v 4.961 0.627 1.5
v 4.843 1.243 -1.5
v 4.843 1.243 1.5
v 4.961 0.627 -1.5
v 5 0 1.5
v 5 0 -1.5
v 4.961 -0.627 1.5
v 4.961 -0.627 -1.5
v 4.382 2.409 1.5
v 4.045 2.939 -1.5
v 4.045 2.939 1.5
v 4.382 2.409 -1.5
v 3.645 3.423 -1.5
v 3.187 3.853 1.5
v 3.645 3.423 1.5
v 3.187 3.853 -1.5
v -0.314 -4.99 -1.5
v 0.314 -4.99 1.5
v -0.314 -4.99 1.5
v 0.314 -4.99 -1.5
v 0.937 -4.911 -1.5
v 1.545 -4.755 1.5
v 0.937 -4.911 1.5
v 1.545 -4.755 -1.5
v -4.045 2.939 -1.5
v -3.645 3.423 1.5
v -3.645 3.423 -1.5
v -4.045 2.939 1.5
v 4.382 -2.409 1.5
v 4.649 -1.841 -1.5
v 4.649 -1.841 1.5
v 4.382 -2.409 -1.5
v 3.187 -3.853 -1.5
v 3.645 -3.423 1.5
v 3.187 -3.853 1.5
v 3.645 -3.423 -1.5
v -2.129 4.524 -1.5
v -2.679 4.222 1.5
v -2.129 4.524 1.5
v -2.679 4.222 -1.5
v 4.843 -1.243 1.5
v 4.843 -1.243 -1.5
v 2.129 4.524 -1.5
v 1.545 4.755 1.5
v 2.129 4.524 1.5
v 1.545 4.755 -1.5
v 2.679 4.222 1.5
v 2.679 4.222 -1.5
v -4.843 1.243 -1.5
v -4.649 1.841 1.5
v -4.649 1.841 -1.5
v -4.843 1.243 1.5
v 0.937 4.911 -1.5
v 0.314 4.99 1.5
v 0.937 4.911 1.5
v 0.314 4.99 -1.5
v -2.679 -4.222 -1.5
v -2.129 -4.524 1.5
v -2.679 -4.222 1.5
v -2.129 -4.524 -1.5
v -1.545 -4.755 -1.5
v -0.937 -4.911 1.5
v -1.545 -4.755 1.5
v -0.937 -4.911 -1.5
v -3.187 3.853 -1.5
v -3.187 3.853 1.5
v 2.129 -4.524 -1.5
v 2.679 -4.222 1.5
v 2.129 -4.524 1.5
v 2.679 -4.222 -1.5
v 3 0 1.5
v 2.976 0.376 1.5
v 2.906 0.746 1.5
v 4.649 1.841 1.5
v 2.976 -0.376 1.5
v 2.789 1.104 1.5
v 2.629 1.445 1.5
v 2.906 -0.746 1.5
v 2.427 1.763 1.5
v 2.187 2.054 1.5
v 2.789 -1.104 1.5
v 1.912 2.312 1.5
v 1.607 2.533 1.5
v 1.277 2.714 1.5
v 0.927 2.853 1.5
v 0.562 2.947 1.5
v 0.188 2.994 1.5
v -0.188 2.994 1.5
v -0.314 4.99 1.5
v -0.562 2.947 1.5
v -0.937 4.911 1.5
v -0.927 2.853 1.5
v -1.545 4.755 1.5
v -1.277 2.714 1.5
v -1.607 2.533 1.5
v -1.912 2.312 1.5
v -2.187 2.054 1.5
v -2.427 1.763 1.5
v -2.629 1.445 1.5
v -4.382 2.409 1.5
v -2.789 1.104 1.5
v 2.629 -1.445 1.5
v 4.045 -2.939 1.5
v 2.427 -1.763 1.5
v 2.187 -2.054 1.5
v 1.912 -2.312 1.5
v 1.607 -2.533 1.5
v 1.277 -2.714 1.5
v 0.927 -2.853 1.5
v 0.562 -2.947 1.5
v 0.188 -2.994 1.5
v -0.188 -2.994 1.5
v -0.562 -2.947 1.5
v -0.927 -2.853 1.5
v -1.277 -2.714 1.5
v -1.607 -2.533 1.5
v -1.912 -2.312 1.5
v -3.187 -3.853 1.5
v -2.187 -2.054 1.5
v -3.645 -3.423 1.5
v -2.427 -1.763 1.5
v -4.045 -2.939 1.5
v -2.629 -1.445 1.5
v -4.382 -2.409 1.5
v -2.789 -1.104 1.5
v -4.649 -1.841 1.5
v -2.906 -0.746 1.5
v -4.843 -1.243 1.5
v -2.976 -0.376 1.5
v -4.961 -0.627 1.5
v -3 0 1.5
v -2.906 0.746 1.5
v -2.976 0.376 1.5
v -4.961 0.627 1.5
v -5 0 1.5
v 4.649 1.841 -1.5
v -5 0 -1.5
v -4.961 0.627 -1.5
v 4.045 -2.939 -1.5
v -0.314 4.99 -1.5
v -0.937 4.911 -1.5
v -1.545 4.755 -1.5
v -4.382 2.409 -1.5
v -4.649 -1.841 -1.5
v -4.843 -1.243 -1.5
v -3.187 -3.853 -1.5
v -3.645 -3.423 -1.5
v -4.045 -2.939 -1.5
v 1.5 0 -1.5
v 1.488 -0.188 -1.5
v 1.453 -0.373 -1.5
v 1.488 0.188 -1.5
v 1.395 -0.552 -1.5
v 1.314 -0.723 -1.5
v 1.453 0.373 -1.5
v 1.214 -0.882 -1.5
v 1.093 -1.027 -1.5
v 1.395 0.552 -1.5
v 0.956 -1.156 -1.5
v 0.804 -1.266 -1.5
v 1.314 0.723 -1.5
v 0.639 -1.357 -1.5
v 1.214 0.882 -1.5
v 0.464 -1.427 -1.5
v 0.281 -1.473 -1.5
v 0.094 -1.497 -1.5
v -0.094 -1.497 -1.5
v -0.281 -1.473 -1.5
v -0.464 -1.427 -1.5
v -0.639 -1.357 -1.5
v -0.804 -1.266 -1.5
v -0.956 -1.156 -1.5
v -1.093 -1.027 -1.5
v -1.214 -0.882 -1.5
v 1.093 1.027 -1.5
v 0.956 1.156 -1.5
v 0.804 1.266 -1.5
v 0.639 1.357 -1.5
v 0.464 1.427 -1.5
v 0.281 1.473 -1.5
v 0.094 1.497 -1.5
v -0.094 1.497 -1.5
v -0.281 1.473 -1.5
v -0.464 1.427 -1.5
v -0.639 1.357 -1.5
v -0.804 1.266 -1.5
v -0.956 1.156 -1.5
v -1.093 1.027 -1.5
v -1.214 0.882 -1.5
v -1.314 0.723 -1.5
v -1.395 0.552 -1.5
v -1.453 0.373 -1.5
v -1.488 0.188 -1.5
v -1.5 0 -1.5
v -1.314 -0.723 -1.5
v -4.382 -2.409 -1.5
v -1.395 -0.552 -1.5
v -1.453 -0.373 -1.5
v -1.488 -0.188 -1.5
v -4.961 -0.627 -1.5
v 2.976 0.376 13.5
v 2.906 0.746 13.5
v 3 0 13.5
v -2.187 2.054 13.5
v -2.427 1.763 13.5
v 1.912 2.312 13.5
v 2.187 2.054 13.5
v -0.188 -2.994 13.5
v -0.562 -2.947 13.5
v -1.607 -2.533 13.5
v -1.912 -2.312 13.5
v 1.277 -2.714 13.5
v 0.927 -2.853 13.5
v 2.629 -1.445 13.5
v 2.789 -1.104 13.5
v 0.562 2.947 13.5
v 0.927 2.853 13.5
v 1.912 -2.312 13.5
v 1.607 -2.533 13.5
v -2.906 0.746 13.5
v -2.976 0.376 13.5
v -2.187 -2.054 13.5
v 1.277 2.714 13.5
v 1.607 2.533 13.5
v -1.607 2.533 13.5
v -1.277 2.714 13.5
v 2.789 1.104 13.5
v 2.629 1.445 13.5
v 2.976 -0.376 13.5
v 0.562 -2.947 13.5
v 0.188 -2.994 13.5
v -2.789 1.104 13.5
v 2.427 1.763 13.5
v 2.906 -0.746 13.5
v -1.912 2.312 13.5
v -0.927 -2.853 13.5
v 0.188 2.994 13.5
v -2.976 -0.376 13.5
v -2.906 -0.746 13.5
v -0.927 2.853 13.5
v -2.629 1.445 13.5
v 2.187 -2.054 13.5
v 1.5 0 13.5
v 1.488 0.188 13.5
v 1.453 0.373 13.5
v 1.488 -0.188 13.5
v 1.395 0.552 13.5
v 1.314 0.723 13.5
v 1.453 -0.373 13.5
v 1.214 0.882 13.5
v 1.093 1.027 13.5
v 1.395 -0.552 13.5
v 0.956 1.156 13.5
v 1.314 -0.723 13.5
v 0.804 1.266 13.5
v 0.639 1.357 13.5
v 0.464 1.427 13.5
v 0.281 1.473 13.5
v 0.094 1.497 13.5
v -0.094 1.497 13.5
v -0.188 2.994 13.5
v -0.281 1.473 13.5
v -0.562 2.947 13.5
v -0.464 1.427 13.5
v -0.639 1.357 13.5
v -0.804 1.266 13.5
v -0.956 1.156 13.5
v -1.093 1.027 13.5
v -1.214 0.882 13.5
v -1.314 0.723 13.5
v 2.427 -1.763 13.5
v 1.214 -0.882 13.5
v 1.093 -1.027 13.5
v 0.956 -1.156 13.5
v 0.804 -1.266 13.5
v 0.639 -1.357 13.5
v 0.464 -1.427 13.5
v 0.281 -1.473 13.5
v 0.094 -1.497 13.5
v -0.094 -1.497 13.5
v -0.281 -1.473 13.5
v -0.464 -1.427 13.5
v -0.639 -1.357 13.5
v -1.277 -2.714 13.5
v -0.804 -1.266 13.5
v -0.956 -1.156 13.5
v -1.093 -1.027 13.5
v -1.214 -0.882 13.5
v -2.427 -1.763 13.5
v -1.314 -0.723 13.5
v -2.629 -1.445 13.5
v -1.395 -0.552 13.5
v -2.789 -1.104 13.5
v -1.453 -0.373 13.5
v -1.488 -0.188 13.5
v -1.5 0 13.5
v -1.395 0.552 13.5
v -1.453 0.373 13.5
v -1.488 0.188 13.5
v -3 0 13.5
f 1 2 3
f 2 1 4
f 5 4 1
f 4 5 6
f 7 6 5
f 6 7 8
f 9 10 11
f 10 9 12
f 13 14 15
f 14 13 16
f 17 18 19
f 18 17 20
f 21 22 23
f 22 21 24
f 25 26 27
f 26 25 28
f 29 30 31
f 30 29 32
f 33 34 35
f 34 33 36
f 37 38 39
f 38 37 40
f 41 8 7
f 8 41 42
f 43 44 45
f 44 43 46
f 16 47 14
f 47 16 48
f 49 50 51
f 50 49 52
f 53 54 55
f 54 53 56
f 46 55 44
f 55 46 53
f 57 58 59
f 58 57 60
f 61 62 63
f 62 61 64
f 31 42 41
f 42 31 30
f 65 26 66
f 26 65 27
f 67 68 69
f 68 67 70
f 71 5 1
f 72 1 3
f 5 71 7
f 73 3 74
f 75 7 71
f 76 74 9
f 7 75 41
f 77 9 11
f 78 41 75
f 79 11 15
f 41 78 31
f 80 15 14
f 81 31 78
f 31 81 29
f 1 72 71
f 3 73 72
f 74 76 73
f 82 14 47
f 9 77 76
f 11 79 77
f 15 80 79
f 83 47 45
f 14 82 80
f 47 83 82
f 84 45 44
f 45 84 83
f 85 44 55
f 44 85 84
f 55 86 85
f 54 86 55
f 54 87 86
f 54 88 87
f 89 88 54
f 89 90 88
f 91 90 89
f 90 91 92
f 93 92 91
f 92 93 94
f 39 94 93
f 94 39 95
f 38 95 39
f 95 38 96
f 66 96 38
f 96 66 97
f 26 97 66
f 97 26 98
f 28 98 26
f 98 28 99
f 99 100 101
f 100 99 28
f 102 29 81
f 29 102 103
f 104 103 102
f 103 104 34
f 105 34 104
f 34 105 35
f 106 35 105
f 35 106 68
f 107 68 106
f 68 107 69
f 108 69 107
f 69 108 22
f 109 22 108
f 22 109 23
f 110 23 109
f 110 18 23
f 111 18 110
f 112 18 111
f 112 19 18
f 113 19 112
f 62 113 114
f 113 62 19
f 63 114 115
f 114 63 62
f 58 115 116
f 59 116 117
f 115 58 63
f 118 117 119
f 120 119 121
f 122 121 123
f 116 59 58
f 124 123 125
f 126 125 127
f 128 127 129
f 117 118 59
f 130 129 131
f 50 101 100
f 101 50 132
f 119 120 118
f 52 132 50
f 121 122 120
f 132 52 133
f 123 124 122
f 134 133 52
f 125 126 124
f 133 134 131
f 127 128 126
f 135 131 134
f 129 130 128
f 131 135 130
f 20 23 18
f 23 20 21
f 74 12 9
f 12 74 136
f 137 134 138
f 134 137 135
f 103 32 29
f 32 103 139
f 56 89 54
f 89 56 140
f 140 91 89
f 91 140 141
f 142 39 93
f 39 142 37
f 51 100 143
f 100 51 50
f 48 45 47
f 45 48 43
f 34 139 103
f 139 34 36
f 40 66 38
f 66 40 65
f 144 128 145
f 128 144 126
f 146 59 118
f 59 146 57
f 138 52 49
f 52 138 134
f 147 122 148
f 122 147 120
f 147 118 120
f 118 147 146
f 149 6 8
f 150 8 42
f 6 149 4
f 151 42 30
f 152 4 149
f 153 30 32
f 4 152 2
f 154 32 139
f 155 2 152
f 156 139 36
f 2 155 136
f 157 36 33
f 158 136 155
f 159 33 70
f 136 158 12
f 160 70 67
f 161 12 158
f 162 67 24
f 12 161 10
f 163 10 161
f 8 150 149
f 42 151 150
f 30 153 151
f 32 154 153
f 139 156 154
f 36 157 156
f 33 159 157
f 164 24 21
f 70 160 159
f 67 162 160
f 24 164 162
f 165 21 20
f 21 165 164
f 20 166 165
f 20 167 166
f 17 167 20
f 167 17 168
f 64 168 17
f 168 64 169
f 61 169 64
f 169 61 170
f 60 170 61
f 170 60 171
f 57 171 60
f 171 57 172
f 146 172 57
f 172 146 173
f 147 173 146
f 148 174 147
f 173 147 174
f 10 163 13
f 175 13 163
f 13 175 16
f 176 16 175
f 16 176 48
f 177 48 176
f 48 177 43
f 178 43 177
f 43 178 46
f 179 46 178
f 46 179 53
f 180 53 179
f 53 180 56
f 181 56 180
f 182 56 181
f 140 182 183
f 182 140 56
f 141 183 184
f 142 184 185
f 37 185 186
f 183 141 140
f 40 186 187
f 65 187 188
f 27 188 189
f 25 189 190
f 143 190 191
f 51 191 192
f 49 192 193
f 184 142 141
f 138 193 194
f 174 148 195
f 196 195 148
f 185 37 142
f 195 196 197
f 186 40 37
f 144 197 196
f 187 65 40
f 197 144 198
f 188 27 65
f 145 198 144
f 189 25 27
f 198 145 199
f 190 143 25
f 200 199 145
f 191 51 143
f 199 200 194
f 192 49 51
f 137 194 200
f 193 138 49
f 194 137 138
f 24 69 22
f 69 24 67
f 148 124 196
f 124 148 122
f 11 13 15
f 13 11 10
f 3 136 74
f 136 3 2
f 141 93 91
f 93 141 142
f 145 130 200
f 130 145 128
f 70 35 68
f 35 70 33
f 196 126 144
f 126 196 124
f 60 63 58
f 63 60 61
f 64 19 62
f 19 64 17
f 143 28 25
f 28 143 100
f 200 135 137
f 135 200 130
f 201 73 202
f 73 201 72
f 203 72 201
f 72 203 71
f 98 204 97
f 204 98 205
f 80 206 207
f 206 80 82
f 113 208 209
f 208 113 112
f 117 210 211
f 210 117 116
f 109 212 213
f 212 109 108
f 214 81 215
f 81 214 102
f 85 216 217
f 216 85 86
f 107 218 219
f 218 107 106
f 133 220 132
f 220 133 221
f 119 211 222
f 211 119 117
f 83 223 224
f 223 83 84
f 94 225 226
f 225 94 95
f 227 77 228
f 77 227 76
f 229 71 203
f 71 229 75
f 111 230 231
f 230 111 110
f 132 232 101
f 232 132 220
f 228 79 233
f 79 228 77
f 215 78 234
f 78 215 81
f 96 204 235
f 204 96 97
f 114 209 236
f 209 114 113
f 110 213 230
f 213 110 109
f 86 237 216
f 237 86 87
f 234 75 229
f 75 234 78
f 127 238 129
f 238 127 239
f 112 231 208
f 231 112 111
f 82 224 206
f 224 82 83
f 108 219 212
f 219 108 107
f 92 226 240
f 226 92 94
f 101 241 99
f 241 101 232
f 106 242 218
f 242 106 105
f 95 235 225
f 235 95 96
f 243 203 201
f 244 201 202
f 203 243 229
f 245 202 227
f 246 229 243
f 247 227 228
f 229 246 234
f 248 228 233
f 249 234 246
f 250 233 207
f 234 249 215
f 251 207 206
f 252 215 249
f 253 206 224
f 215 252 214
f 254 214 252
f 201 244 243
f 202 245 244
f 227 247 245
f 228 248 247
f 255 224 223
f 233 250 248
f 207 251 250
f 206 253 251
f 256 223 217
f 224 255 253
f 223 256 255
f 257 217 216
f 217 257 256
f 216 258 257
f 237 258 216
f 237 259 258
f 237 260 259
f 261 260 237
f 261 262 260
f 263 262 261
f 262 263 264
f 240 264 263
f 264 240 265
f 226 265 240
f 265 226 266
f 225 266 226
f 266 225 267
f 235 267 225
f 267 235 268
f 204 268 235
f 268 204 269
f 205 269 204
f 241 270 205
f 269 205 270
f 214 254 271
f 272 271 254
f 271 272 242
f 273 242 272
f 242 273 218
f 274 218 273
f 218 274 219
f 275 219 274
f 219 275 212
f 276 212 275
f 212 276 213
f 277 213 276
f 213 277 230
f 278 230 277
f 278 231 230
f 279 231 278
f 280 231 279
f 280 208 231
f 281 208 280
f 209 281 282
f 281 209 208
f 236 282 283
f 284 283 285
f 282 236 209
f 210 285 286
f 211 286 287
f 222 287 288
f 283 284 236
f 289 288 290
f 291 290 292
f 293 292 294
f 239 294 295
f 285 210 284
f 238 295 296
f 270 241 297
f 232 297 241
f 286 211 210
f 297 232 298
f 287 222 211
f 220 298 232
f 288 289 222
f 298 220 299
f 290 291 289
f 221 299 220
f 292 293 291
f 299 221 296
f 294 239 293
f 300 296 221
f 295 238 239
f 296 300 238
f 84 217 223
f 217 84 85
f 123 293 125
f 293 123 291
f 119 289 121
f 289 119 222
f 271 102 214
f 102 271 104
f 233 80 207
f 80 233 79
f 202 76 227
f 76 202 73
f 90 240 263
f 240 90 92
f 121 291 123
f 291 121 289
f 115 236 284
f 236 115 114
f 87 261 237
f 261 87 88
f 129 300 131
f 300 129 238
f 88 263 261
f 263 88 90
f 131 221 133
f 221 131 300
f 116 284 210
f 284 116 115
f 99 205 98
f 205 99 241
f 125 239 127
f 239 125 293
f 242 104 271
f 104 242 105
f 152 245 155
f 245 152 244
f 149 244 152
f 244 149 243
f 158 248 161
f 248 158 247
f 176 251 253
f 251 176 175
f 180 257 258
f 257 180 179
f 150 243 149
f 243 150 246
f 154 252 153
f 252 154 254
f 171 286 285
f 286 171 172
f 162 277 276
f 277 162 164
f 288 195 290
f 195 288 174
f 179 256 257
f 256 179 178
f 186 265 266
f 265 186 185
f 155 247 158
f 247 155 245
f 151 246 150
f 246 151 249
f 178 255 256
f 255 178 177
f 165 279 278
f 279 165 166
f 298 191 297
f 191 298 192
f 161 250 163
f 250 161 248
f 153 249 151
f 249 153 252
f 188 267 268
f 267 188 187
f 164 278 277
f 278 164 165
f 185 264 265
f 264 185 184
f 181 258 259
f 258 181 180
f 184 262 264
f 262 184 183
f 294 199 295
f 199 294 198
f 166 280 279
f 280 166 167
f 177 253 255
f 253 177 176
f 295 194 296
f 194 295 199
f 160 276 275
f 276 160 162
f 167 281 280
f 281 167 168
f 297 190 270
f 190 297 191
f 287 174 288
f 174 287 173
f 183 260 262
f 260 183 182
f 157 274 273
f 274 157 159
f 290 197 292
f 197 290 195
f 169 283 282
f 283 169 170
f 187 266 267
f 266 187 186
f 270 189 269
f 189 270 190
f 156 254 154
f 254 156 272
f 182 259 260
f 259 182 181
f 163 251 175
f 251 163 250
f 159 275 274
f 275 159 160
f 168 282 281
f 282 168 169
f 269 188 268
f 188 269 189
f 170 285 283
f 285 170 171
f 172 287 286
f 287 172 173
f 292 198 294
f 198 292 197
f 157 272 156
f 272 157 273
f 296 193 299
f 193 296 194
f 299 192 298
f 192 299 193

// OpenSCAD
$fn = 50;


difference() {
	union() {
		translate(v = [0, 0, -1.5000000000]) {
			cylinder(h = 3, r = 5.0000000000);
		}
		translate(v = [0, 0, -1.5000000000]) {
			cylinder(h = 15, r = 3.0000000000);
		}
	}
	union() {
		translate(v = [0, 0, -100.0000000000]) {
			cylinder(h = 200, r = 1.5000000000);
		}
	}
}
